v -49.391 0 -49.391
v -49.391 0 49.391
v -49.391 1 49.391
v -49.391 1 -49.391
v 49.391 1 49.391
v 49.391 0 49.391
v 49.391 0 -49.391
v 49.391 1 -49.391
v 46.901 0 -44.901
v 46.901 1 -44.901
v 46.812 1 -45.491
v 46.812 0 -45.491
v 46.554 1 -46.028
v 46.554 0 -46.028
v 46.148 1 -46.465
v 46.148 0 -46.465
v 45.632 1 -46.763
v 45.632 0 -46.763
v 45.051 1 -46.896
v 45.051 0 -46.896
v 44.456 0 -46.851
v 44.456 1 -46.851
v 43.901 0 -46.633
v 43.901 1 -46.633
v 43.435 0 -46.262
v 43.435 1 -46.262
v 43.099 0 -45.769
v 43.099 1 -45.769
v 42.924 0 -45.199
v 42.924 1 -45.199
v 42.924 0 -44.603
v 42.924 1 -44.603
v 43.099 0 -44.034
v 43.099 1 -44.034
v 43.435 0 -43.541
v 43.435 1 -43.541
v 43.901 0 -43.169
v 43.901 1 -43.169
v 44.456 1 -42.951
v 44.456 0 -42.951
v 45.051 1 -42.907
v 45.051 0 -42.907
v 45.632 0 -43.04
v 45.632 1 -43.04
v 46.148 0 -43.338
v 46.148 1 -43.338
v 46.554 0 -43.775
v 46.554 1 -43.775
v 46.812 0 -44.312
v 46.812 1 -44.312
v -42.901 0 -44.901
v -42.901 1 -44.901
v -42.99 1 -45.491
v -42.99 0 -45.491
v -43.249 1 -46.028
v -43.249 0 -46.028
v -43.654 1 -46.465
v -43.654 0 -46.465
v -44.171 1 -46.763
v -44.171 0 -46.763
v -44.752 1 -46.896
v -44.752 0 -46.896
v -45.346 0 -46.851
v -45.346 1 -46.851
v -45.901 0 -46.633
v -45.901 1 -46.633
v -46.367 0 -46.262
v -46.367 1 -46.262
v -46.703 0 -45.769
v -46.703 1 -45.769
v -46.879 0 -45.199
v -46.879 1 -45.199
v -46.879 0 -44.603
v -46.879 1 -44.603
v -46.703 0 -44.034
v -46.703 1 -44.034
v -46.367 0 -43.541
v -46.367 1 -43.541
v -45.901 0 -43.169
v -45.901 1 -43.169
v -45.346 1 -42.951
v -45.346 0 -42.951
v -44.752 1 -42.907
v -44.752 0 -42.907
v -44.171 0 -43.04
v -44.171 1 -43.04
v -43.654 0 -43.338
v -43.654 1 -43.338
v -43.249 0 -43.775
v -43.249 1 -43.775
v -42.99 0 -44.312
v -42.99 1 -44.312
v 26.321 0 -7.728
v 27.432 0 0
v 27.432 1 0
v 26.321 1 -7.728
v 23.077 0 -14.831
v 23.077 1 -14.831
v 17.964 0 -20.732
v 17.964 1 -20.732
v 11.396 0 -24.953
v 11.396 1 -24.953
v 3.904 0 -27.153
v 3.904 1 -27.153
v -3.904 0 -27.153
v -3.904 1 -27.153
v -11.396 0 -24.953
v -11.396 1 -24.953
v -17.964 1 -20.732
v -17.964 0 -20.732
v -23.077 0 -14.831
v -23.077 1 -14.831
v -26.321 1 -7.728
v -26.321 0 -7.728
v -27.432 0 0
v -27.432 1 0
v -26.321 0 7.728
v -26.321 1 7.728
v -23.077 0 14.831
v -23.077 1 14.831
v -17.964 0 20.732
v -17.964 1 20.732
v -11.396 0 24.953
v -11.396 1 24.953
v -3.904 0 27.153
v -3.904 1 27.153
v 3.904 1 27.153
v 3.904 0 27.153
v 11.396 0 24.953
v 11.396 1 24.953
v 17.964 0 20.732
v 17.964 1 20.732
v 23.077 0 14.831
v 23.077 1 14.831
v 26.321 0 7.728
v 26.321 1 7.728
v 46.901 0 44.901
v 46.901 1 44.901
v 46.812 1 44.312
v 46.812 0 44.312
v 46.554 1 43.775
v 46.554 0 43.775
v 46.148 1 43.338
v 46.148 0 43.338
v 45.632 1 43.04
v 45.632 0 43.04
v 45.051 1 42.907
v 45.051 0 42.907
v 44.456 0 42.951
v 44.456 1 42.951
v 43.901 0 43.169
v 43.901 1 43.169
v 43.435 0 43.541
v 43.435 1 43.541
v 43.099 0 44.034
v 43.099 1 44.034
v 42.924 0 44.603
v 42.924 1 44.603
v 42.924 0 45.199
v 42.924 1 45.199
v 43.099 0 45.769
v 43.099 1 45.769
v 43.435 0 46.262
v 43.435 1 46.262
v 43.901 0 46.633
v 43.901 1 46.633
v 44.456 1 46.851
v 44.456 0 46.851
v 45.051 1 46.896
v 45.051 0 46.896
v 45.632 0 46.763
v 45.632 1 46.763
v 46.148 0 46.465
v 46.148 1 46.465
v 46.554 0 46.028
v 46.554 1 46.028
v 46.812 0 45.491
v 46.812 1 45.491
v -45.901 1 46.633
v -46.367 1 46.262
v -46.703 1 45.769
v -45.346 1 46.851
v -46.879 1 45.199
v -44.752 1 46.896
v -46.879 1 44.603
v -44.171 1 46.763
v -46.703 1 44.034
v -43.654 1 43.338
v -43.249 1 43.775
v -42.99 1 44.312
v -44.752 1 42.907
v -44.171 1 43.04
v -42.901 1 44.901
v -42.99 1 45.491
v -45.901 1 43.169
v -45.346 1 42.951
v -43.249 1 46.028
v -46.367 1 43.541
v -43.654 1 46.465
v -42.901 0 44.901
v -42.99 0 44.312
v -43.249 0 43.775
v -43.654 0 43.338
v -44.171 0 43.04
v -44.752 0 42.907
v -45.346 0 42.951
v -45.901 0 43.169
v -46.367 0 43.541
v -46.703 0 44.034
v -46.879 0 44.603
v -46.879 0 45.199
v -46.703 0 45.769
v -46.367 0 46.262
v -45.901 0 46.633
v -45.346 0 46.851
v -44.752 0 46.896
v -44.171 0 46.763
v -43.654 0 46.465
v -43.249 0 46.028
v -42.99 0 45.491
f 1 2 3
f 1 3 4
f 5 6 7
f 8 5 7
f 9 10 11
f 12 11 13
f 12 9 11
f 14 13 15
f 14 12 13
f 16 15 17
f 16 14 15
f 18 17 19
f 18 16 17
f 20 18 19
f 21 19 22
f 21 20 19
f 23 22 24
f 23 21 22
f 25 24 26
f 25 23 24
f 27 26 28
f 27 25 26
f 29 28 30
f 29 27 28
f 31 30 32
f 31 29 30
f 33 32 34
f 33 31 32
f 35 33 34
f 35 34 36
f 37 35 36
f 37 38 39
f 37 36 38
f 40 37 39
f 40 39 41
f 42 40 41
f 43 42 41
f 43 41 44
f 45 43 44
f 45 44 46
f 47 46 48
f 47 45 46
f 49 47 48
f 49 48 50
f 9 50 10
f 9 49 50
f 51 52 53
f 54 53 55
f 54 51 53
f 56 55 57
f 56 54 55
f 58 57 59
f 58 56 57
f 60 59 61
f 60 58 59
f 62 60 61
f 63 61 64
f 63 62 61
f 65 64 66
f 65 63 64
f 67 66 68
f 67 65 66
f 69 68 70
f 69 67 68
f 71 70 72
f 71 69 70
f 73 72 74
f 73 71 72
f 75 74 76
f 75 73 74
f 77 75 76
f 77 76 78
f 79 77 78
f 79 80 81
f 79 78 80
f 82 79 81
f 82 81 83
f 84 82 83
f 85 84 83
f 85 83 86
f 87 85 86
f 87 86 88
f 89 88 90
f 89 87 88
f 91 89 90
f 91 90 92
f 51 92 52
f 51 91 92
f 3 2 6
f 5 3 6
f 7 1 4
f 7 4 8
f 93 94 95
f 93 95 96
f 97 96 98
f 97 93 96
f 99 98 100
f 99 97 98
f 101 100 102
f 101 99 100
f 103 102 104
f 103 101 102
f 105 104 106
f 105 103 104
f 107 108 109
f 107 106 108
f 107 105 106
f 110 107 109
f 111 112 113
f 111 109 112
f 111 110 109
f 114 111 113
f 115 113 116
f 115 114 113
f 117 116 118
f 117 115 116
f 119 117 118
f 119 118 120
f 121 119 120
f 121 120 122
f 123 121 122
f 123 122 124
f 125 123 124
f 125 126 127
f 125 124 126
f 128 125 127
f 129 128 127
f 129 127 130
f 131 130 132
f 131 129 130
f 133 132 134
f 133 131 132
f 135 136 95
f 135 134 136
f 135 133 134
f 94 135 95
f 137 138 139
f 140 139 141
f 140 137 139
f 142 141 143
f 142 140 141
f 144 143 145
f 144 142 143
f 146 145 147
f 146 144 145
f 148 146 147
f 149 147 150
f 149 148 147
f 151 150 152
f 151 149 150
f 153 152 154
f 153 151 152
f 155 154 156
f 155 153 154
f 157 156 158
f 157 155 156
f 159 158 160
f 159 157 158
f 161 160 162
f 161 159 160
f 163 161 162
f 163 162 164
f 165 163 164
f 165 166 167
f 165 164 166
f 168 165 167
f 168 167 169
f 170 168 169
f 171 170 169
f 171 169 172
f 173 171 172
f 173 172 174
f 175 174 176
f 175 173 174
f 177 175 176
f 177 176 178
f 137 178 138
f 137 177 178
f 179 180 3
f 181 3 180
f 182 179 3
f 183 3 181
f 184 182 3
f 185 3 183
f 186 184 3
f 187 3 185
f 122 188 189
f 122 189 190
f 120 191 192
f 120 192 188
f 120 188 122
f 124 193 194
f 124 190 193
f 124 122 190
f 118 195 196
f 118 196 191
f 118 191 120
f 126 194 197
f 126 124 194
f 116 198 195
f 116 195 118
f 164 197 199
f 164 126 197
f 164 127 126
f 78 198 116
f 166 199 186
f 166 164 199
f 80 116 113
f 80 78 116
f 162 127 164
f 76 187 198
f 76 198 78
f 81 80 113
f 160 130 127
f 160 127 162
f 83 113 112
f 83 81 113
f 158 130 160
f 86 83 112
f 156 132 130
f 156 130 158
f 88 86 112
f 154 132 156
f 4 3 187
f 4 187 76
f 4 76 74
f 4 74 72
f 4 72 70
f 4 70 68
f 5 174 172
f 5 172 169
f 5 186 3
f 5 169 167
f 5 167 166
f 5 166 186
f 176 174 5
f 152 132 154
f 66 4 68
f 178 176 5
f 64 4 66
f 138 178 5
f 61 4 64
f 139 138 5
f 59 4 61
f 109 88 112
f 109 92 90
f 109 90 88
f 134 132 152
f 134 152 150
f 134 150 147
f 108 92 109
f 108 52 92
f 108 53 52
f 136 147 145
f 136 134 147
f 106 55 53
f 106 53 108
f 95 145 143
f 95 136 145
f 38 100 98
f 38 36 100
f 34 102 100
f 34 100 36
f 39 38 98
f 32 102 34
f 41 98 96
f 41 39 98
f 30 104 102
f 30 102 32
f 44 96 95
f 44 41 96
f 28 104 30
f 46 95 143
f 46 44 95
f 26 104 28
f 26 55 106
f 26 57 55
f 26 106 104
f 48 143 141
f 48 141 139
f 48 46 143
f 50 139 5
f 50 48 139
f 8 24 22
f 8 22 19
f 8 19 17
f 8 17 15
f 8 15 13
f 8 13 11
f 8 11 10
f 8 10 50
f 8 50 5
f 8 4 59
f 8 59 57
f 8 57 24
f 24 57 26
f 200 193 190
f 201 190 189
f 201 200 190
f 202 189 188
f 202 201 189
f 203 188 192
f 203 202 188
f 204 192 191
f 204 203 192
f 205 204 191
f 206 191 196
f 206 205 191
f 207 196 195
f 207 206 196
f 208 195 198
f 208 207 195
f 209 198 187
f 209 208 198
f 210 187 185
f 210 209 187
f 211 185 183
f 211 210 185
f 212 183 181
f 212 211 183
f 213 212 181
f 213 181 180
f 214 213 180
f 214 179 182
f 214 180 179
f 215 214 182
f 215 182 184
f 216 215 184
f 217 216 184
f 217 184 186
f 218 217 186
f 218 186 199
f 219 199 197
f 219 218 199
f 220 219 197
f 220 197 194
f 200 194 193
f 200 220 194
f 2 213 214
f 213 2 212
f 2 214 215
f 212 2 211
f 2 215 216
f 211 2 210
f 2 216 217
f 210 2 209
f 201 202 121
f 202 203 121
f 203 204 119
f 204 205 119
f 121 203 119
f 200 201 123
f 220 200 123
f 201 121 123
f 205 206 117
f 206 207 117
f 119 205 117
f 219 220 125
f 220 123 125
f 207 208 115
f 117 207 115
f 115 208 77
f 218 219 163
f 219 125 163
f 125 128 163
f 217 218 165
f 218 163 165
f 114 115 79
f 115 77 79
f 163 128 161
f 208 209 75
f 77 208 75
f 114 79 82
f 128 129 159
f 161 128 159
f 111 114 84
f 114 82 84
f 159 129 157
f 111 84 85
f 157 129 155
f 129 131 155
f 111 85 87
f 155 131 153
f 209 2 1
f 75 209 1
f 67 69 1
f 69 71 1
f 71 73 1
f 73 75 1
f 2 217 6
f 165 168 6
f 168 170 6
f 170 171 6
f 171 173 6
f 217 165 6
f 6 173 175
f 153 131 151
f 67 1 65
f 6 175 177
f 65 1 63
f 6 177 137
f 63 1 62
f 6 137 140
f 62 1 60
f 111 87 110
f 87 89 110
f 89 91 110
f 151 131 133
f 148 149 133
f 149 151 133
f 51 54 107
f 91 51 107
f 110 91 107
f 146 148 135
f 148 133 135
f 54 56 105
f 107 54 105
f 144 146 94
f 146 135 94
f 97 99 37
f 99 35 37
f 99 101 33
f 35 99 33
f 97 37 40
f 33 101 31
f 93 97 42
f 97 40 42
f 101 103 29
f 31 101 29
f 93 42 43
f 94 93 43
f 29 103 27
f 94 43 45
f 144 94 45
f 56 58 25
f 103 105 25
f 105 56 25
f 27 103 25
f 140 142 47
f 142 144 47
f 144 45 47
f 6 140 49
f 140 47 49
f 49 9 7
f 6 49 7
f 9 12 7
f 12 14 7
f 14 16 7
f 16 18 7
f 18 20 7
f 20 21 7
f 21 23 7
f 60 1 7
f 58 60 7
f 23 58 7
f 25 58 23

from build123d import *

# Parameters (mm, degrees)
SKETCH1_W           = 98.782817332
SKETCH1_H           = 98.782817332
BOSS_EXTRUDE1_DEPTH = 1.000000032
SKETCH3_R           = 2.000000064
CUT_EXTRUDE2_DEPTH  = 2.000000032
SKETCH4_R           = 27.432
CUT_EXTRUDE3_DEPTH  = 2.000000032


with BuildPart() as part:
    # Sketch1 → Boss-Extrude1 (new body)
    with BuildSketch(Plane(origin=(0, 0, 0), x_dir=(1, 0, 0), z_dir=(0, 1, 0))):
        Rectangle(SKETCH1_W, SKETCH1_H)
    extrude(amount=BOSS_EXTRUDE1_DEPTH)

    # Sketch3 → Cut-Extrude2 (cut, through all)
    with BuildSketch(Plane(origin=(0, 0, 0), x_dir=(1, 0, 0), z_dir=(0, 1, 0))):
        with Locations((44.901280605, 44.901280605)):
            Circle(SKETCH3_R)
        with Locations((44.901280605, -44.901280605)):
            Circle(SKETCH3_R)
        with Locations((-44.901280605, -44.901280605)):
            Circle(SKETCH3_R)
        with Locations((-44.901280605, 44.901280605)):
            Circle(SKETCH3_R)
    extrude(amount=CUT_EXTRUDE2_DEPTH, mode=Mode.SUBTRACT)

    # Sketch4 → Cut-Extrude3 (cut, through all)
    with BuildSketch(Plane(origin=(0, 0, 0), x_dir=(1, 0, 0), z_dir=(0, 1, 0))):
        Circle(SKETCH4_R)
    extrude(amount=CUT_EXTRUDE3_DEPTH, mode=Mode.SUBTRACT)


solid = part.part
